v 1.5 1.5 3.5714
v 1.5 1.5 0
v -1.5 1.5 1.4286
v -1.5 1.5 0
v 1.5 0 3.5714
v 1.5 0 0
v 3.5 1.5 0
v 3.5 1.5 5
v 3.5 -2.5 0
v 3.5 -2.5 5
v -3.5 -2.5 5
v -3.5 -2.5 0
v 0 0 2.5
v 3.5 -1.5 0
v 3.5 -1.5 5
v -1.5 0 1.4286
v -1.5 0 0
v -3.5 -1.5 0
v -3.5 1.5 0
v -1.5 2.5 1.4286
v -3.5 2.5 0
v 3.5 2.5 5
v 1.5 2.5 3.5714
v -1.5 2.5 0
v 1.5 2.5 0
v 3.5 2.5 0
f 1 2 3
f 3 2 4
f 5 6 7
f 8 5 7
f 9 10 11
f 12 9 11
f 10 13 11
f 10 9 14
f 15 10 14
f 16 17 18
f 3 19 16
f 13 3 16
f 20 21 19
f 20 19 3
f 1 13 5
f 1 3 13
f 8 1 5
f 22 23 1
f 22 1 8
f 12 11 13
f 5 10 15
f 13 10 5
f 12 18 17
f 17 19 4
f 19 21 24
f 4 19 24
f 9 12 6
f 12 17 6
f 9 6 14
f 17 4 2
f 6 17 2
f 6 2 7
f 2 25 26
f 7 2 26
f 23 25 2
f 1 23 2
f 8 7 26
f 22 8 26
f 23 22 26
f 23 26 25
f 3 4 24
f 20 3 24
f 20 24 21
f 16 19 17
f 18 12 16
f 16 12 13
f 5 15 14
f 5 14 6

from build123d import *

# Parameters (mm, degrees)
BOSS_EXTRUDE1_DEPTH = 5
CUT_EXTRUDE1_DEPTH  = 5
BOSS_EXTRUDE2_DEPTH = 2.5
CUT_EXTRUDE2_DEPTH  = 2.5
CUT_EXTRUDE3_DEPTH  = 2.5


with BuildPart() as part:
    # Sketch1 → Boss-Extrude1 (new body)
    with BuildSketch(Plane.XY):
        Polygon((-3.5, -2.5), (3.5, -2.5), (3.5, -1.5), (1.5, 0), (3.5, 1.5), (3.5, 2.5), (1.5, 2.5), (1.5, 1.5), (-1.5, 1.5), (-1.5, 2.5), (-3.5, 2.5), (-3.5, 1.5), (-1.5, 0), (-3.5, -1.5), align=None)
    extrude(amount=BOSS_EXTRUDE1_DEPTH)

    # Sketch2 → Cut-Extrude1 (cut)
    with BuildSketch(Plane(origin=(0, 2.5, 0), x_dir=(1, 0, 0), z_dir=(0, 1, 0))):
        Polygon((-3.5, 0), (3.5, -5), (-3.5, -5), align=None)
    extrude(amount=-CUT_EXTRUDE1_DEPTH, mode=Mode.SUBTRACT)

    # Sketch3 → Boss-Extrude2 (add)
    with BuildSketch(Plane.XZ.offset(2.5)):
        Polygon((-3.5, 0), (-3.5, 5), (3.5, 5), align=None)
    extrude(amount=-BOSS_EXTRUDE2_DEPTH)

    # 3DSketch2 → Cut-Extrude2 (cut, along a direction that is not the sketch's normal)
    with BuildSketch(Plane(origin=(-3.5, -2.5, 0), x_dir=(0, 0, 1), z_dir=(-0.5812381937190964, 0.8137334712067351, 0))):
        Polygon((0, 0), (2.5, 4.301162634), (5, 0), align=None)
    extrude(amount=CUT_EXTRUDE2_DEPTH, dir=(0, 1, 0), mode=Mode.SUBTRACT)

    # 3DSketch3 → Cut-Extrude3 (cut, along a direction that is not the sketch's normal)
    with BuildSketch(Plane(origin=(0, 0, 2.5), x_dir=(-0.7035264706814485, -0.502518907629606, 0.502518907629606), z_dir=(0, 0.7071067811865476, 0.7071067811865476))):
        Polygon((0, 0), (4.974937186, 0), (0.050251891, 4.974683382), align=None)
    extrude(amount=CUT_EXTRUDE3_DEPTH, dir=(0, 1, 0), mode=Mode.SUBTRACT)


solid = part.part
